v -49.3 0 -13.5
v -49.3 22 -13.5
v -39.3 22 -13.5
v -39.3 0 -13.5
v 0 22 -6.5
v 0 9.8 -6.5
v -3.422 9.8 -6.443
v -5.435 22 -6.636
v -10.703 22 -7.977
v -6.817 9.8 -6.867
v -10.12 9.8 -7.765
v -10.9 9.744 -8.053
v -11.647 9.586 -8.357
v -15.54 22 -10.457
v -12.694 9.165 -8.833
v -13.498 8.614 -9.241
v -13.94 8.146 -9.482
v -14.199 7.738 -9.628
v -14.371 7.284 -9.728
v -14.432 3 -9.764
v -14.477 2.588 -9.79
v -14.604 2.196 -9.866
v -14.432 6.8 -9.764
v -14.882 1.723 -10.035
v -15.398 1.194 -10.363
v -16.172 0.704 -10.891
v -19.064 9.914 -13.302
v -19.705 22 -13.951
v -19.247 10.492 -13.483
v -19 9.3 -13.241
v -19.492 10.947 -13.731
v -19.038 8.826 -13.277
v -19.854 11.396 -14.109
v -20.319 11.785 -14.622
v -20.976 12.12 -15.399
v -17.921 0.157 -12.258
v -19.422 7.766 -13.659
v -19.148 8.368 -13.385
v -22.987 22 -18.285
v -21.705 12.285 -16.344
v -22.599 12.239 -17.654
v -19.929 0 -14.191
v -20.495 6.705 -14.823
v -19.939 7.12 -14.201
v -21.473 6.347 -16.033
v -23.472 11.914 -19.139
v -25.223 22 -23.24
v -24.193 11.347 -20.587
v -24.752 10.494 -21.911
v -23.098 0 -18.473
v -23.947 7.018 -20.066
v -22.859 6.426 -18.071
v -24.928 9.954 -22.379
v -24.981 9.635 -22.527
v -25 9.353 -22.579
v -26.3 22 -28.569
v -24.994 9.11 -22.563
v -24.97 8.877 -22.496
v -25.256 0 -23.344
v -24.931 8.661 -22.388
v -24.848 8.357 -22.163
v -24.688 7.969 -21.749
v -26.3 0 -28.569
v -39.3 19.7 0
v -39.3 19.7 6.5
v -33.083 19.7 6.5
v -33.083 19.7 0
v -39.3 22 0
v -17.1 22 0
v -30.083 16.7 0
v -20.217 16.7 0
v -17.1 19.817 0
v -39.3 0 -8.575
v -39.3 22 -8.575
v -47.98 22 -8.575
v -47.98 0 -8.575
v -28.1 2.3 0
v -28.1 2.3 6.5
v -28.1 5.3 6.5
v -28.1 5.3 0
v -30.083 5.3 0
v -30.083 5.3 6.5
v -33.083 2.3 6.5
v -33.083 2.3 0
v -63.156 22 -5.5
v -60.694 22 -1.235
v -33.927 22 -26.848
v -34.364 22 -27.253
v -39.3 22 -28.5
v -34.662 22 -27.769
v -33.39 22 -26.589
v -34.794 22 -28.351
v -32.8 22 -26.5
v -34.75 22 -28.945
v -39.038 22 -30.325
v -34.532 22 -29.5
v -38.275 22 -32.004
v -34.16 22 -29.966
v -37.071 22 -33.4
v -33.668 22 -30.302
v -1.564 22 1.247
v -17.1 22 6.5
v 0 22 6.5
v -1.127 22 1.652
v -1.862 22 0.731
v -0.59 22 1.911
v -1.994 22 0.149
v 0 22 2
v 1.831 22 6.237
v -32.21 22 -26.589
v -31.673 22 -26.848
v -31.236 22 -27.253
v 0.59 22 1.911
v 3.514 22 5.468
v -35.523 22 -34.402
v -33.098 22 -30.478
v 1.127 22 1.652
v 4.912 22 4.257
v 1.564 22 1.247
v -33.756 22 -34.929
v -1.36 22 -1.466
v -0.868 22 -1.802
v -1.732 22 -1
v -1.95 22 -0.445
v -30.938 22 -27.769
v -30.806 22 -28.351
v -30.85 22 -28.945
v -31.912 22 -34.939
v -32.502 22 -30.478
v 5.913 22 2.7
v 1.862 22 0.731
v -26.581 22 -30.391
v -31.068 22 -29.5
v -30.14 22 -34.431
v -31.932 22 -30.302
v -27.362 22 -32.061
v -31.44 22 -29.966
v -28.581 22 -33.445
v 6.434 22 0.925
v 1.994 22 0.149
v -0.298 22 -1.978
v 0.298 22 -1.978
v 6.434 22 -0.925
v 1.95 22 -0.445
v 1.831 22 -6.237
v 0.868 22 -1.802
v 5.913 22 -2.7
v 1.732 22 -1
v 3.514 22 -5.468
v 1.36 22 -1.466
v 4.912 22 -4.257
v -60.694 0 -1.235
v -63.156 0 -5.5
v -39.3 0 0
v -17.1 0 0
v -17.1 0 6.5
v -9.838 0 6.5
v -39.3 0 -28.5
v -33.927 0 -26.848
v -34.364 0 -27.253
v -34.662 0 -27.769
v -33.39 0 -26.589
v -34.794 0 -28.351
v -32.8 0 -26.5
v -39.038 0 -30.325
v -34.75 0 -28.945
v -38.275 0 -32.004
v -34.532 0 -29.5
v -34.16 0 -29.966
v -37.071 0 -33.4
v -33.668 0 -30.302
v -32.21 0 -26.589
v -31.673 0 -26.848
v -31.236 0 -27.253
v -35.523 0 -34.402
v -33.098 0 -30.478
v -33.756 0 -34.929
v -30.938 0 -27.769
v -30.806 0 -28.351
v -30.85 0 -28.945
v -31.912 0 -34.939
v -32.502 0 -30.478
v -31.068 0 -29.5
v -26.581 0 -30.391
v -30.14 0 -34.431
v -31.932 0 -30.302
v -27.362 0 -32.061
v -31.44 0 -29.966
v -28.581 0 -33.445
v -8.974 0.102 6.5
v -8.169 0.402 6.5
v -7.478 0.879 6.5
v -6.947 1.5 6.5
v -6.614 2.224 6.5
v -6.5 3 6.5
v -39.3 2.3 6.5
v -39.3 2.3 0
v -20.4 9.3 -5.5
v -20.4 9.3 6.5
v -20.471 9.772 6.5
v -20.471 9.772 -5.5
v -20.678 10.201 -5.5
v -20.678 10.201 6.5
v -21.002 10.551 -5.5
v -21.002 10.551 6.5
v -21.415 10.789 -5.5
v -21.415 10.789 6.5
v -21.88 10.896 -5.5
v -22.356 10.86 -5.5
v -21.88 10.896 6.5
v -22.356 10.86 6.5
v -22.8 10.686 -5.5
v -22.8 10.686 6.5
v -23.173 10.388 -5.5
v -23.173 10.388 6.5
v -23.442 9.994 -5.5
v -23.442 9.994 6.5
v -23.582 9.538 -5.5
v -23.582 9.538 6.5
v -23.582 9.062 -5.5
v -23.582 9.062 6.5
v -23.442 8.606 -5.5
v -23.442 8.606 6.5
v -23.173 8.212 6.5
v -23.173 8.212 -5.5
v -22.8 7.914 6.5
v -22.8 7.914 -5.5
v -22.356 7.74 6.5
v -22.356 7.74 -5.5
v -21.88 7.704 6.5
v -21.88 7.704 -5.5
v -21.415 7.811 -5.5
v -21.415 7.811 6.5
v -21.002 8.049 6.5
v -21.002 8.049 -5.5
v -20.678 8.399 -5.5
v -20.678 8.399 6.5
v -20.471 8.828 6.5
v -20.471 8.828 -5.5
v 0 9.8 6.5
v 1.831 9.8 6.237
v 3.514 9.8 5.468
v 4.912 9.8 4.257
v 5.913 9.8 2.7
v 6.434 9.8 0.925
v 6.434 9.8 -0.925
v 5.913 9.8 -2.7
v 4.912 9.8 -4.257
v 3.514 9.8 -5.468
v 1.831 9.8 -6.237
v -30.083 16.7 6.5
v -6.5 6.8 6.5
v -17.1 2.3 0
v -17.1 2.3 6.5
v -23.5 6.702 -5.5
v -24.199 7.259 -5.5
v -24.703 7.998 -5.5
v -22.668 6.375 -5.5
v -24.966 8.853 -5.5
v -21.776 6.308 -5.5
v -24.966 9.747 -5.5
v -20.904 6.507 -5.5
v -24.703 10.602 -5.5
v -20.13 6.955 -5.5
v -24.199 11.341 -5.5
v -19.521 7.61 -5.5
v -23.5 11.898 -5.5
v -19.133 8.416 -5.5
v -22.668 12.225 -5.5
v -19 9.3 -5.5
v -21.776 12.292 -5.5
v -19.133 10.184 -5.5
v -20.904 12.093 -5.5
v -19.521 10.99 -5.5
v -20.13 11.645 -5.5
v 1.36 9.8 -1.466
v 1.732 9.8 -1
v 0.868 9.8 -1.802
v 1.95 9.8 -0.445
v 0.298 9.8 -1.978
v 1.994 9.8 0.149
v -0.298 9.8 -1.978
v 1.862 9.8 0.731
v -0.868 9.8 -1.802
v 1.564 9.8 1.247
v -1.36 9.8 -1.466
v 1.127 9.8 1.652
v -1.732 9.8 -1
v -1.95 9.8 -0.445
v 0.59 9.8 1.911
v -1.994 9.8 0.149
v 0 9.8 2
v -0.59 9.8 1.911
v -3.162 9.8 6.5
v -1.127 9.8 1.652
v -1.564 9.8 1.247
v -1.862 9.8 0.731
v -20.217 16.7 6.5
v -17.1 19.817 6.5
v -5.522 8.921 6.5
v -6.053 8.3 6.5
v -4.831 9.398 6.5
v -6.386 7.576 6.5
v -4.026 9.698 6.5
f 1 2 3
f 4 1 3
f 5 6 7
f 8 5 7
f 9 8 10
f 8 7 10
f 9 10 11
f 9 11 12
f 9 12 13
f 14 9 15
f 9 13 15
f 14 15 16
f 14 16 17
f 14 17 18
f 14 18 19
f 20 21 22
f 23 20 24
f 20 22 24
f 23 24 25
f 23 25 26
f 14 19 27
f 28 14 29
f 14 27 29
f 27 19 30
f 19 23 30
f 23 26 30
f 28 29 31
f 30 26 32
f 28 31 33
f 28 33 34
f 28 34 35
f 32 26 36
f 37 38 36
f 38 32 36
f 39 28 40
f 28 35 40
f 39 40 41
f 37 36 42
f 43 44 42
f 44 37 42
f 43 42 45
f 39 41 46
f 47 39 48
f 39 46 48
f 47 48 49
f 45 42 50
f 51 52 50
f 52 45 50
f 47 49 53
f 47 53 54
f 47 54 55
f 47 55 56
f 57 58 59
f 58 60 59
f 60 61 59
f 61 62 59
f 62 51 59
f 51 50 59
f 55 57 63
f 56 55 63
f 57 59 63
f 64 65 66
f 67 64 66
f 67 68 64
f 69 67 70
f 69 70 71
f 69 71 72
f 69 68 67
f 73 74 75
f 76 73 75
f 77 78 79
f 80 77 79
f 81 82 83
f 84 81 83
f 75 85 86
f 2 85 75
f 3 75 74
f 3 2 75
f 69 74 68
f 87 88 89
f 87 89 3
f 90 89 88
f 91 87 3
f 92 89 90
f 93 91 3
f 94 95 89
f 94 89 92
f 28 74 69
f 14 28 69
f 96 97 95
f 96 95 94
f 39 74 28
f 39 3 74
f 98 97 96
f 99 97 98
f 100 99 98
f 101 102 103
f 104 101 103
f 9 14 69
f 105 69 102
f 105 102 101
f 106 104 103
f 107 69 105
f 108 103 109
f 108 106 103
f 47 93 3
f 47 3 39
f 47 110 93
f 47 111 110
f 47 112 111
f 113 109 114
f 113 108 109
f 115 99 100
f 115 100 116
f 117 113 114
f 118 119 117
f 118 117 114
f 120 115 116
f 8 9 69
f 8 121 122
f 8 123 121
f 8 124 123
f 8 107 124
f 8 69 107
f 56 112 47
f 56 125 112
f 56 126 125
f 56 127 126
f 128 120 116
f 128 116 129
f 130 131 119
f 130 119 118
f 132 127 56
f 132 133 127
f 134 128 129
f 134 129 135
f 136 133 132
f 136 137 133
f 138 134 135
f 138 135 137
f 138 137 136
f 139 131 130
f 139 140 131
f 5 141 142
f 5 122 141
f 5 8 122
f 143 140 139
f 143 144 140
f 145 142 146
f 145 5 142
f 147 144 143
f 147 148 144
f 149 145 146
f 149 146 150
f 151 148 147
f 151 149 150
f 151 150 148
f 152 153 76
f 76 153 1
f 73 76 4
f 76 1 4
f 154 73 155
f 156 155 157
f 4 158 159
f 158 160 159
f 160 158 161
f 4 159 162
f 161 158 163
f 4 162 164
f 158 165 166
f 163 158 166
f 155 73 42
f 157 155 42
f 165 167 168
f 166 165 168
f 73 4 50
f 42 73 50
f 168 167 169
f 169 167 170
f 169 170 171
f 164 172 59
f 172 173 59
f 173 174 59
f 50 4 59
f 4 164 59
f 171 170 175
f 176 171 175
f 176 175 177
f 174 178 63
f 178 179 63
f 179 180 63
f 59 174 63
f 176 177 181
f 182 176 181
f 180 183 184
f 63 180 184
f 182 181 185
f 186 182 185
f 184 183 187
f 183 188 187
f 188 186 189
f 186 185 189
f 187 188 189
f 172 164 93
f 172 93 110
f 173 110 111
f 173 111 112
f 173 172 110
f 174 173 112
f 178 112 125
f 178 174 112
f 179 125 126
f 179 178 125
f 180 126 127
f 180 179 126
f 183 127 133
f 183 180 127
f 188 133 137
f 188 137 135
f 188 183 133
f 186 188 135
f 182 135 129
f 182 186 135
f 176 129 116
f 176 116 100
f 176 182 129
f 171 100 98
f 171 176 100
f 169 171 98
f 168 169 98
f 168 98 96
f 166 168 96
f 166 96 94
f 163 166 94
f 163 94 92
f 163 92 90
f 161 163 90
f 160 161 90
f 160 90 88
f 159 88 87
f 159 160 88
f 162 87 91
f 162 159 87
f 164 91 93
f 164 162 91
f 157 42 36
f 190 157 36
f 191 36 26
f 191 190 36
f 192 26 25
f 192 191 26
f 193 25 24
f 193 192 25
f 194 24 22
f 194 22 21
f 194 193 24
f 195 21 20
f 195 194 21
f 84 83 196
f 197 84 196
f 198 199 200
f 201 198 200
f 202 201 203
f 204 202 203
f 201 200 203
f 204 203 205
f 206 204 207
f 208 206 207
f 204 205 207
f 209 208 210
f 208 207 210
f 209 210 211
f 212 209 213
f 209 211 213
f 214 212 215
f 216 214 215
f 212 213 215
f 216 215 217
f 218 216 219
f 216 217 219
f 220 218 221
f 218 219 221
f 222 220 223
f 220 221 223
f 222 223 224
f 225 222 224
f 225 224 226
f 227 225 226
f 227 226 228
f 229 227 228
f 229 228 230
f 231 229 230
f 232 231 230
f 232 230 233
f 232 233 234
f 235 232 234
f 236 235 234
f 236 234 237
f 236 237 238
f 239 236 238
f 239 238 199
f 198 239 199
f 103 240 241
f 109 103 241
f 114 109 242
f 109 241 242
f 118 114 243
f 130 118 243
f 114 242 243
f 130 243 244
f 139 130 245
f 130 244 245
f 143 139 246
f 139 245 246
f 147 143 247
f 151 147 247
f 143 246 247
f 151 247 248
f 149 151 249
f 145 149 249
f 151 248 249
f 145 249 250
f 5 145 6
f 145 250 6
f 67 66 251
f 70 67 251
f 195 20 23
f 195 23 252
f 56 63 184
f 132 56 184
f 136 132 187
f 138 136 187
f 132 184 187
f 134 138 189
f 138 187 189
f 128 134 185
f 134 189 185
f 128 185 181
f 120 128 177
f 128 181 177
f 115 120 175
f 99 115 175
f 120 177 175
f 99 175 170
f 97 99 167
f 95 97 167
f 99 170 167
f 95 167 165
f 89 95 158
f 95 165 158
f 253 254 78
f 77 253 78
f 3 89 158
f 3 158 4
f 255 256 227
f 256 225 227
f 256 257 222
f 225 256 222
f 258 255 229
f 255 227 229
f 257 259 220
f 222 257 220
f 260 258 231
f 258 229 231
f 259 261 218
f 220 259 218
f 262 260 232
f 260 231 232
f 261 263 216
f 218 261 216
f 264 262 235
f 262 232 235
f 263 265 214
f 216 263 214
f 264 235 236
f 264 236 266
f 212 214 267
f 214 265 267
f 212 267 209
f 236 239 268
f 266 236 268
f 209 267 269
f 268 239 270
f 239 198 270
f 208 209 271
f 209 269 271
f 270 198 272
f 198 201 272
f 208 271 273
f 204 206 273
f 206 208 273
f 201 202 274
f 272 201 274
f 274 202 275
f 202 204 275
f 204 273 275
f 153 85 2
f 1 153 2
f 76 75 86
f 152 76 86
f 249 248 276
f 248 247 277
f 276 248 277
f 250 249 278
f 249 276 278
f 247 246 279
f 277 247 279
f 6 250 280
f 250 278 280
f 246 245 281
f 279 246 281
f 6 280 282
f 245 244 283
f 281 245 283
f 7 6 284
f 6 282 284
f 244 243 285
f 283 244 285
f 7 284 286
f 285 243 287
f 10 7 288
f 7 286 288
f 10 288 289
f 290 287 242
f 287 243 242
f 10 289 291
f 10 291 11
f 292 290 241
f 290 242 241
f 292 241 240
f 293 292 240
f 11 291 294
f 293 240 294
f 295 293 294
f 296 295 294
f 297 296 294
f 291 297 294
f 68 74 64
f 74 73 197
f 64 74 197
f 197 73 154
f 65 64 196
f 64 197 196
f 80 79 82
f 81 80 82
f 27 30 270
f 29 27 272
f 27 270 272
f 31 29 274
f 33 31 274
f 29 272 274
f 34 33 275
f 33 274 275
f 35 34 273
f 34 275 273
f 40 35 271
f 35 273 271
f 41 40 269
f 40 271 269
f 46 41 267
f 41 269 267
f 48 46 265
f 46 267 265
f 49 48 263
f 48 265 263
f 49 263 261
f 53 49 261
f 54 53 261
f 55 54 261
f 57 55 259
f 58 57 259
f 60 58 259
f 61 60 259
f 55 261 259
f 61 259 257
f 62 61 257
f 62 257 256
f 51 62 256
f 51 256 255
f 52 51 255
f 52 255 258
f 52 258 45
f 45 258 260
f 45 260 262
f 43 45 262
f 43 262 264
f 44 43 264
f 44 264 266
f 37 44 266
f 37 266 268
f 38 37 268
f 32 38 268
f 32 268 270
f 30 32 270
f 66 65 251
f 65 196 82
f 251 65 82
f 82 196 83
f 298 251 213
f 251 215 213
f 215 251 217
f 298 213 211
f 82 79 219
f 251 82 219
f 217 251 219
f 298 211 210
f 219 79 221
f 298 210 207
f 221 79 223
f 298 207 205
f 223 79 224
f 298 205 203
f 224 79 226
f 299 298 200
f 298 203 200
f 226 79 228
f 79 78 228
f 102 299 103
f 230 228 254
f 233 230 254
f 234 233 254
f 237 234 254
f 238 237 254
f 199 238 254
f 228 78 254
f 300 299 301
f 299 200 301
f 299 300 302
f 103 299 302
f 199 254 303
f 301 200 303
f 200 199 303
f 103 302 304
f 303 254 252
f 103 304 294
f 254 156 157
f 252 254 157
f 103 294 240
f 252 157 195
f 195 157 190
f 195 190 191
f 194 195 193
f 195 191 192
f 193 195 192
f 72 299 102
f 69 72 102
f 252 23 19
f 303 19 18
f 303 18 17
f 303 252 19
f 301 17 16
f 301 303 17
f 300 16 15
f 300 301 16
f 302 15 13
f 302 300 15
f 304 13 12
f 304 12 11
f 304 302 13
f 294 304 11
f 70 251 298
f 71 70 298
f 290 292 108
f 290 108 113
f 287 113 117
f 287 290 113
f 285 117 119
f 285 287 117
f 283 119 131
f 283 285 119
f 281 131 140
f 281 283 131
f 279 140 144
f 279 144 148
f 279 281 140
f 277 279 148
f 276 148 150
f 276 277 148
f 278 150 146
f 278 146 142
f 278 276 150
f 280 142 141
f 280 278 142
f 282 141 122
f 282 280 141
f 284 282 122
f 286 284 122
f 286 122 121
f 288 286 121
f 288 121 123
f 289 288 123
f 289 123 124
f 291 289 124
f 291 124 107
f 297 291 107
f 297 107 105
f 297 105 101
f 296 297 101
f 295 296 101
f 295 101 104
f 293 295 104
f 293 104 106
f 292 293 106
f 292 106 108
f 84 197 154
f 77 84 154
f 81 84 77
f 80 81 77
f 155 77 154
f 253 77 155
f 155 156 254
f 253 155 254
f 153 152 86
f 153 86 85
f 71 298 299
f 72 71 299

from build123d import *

# Parameters (mm, degrees)
SKETCH1_R           = 2
BOSS_EXTRUDE1_DEPTH = 22
CUT_EXTRUDE1_DEPTH  = 6.5
CUT_EXTRUDE3_DEPTH  = 9.8
FILLET2_R           = 3
SKETCH7_R           = 1.6
CUT_EXTRUDE4_DEPTH  = 62.243285382
SKETCH8_R           = 3
CUT_EXTRUDE5_DEPTH  = 54.839948035
BOSS_EXTRUDE3_DEPTH = 22


with BuildPart() as part:
    # Sketch1 → Boss-Extrude1 (new body)
    with BuildSketch(Plane(origin=(0, 0, 0), x_dir=(1, 0, 0), z_dir=(0, 1, 0))):
        with BuildLine():
            Line((-39.3, 28.5), (-39.3, -6.5))
            Line((-39.3, -6.5), (0, -6.5))
            ThreePointArc((0, -6.5), (6.5, 0), (0, 6.5))
            ThreePointArc((0, 6.5), (-17.72074287, 12.087328765), (-26.300362263, 28.568624275))
            ThreePointArc((-26.300362263, 28.568624275), (-32.834312616, 34.999909434), (-39.3, 28.5))
        make_face()
        with Locations(Location((0, 0, 0), (0, 0, 270))):
            Circle(SKETCH1_R, mode=Mode.SUBTRACT)
        with Locations(Location((-32.8, 28.5, 0), (0, 0, 270))):
            Circle(SKETCH1_R, mode=Mode.SUBTRACT)
    extrude(amount=BOSS_EXTRUDE1_DEPTH)

    # Sketch2 → Cut-Extrude1 (cut)
    with BuildSketch(Plane.XY.offset(6.5)):
        Polygon((-17.1, 2.3), (-28.1, 2.3), (-28.1, 5.3), (-30.082842712, 5.3), (-33.082842712, 2.3), (-39.3, 2.3), (-39.3, 0), (-17.1, 0), align=None)
        Polygon((-39.5, 19.7), (-33.082842712, 19.7), (-30.082842712, 16.7), (-20.217157288, 16.7), (-17.100012785, 19.817144502), (-17.099645022, 22.2), (-39.5, 22.2), align=None)
    extrude(amount=-CUT_EXTRUDE1_DEPTH, mode=Mode.SUBTRACT)

    # Sketch6 → Cut-Extrude3 (cut)
    with BuildSketch(Plane.XZ):
        with BuildLine():
            Line((-6.5, 6.5), (0, 6.5))
            ThreePointArc((0, 6.5), (6.5, 0), (0, -6.5))
            ThreePointArc((0, -6.5), (-7.470973074, -7.005610766), (-14.432472984, -9.763979833))
            Line((-14.432472984, -9.763979833), (-6.5, 6.5))
        make_face()
    extrude(amount=-CUT_EXTRUDE3_DEPTH, mode=Mode.SUBTRACT)

    # Fillet2
    fillet2_edges = [part.edges().sort_by_distance(p)[0] for p in [
        (-10.466236492, 9.8, -1.631989916),
        (-10.466236492, 0, -1.631989916),
    ]]
    fillet(fillet2_edges, radius=FILLET2_R)

    # Sketch7 → Cut-Extrude4 (cut, through all)
    with BuildSketch(Plane.XY.offset(6.5)):
        with Locations((-22, 9.3)):
            Circle(SKETCH7_R)
    extrude(amount=-CUT_EXTRUDE4_DEPTH, mode=Mode.SUBTRACT)

    # Sketch8 → Cut-Extrude5 (cut, through all)
    with BuildSketch(Plane.XY.offset(-5.5)):
        with Locations((-22, 9.3)):
            Circle(SKETCH8_R)
    extrude(amount=-CUT_EXTRUDE5_DEPTH, mode=Mode.SUBTRACT)

    # Sketch9 → Boss-Extrude3 (add)
    with BuildSketch(Plane(origin=(0, 22, 0), x_dir=(1, 0, 0), z_dir=(0, 1, 0))):
        Polygon((-39.3, 8.575003739), (-47.980351229, 8.575003739), (-60.69390833, 1.234828124), (-63.156406461, 5.5), (-49.3, 13.5), (-39.3, 13.5), align=None)
    extrude(amount=-BOSS_EXTRUDE3_DEPTH)


solid = part.part
